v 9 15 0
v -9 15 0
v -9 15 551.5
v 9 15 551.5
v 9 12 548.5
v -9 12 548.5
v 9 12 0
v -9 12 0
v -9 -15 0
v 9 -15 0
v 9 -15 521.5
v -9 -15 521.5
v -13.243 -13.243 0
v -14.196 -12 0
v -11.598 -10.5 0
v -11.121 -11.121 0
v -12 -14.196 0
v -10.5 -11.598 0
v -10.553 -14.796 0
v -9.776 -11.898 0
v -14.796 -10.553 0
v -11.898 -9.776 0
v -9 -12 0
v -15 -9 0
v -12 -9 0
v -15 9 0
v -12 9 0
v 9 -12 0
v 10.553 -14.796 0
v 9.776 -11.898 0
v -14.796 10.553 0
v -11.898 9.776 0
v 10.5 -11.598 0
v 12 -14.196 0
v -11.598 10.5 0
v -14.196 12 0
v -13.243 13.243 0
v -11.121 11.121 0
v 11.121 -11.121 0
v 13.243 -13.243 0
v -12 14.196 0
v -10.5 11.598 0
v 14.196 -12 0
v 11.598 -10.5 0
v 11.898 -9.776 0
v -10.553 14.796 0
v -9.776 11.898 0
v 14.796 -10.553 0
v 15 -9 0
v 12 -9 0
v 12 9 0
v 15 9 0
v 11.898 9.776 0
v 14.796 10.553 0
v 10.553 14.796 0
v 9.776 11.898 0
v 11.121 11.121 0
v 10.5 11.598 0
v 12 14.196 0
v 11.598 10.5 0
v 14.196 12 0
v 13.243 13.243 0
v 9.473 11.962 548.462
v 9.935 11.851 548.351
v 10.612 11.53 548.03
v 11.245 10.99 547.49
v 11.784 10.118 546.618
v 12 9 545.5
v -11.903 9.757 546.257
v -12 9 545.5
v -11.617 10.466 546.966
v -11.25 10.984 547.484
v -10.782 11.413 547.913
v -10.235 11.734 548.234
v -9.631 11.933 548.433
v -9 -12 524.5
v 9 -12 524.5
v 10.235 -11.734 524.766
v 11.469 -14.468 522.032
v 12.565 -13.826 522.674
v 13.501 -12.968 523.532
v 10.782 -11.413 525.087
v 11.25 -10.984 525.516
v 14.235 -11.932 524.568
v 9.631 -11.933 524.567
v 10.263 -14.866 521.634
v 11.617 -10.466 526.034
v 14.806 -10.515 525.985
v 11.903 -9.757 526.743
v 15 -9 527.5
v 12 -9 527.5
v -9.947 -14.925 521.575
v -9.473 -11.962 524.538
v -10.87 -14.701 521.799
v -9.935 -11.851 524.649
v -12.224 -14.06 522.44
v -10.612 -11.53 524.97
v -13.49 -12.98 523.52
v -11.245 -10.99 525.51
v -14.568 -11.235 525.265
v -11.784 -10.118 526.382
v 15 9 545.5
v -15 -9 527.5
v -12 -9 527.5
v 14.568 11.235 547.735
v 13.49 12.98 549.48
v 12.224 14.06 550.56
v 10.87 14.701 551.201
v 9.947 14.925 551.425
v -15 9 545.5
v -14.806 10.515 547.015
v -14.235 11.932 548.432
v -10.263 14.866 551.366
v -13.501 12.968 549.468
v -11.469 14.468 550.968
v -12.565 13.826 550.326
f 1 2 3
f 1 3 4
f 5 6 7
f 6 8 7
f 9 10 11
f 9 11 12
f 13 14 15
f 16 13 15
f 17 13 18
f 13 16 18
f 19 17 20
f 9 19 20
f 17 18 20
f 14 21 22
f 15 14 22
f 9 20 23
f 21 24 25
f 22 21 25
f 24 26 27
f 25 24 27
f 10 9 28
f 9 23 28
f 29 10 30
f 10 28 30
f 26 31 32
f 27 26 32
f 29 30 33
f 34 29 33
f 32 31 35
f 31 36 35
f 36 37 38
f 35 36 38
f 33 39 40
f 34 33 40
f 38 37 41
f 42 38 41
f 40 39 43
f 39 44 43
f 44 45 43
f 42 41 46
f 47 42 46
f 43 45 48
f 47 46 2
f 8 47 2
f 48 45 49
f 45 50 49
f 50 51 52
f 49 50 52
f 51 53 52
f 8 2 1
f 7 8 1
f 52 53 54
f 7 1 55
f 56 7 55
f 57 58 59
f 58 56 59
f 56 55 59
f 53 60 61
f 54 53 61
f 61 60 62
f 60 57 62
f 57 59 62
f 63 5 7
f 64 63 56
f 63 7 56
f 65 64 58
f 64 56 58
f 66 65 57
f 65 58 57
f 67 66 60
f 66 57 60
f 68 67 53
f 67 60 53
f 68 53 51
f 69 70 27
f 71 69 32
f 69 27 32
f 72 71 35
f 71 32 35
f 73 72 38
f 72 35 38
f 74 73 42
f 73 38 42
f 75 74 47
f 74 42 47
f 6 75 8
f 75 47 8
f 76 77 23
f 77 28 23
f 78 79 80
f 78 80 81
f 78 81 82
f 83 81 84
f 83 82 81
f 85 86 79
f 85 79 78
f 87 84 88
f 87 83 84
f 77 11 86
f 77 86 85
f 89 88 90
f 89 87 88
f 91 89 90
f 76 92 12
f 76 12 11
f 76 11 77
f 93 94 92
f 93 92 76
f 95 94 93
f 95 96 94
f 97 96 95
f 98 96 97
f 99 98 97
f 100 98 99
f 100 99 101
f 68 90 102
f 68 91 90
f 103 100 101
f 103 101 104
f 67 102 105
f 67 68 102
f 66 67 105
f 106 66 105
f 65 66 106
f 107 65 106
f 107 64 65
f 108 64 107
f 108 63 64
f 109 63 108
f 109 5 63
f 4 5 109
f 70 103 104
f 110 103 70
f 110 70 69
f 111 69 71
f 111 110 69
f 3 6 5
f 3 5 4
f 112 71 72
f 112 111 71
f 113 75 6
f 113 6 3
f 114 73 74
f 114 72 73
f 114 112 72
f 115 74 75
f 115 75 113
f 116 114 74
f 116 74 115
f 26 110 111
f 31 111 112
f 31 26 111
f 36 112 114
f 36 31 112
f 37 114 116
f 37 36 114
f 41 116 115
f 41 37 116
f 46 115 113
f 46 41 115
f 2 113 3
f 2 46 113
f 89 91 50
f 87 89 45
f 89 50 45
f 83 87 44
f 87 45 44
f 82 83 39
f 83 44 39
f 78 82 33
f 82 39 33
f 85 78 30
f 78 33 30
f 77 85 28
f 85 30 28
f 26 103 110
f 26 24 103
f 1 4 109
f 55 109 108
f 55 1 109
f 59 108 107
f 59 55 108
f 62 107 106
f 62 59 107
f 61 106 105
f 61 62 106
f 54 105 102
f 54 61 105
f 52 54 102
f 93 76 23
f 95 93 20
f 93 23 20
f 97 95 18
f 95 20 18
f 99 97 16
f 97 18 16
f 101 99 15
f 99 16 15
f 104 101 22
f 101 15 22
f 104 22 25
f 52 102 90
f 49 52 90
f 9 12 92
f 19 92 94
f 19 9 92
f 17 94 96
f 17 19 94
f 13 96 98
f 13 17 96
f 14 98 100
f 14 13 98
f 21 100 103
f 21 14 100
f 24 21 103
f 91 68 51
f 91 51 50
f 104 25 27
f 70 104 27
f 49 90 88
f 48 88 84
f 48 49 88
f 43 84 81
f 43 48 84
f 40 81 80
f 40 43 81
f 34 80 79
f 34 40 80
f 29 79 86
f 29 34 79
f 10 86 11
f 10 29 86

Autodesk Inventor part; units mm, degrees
ref_plane "Start Plane" through (0, 0, 0) normal (0, 0, 1) x (1, 0, 0)
ref_plane "End Plane" through (0, 0, 551.5) normal (0, 0, 1) x (1, 0, 0)
sketch "Sketch" plane through (0, 0, 0) normal (0, 0, 1) x (1, 0, 0)
  line L0 (-15, -9) -> (-15, 9)
  line L1 (-9, 15) -> (9, 15)
  line L2 (15, 9) -> (15, -9)
  line L3 (9, -15) -> (-9, -15)
  arc A0 (-15, -9) -> (-9, -15) centre (-9, -9) ccw
  arc A1 (-9, 15) -> (-15, 9) centre (-9, 9) ccw
  arc A2 (15, 9) -> (9, 15) centre (9, 9) ccw
  arc A3 (9, -15) -> (15, -9) centre (9, -9) ccw
  arc A4 (-9, 12) -> (-12, 9) centre (-9, 9) ccw
  line L4 (-9, 12) -> (9, 12)
  arc A5 (12, 9) -> (9, 12) centre (9, 9) ccw
  line L5 (12, 9) -> (12, -9)
  arc A6 (9, -12) -> (12, -9) centre (9, -9) ccw
  line L6 (9, -12) -> (-9, -12)
  arc A7 (-12, -9) -> (-9, -12) centre (-9, -9) ccw
  line L7 (-12, -9) -> (-12, 9)
  line L8 (0, 22.7397) -> (0, -22.7397) construction
  line L9 (-22.7397, 0) -> (22.7397, 0) construction
  dimension "d7" = 6
  dimension "d10" = 30
  dimension "d11" = 30
  dimension "d12" = 3
  dimension "d15" = 15
  dimension "d16" = 15
extrude "Body" add sketch "Sketch" along normal up to surface (551.5 mm away) from surface at 0
sketch "Sketch3" plane through (0, 0, 0) normal (0, 0, 1) x (1, 0, 0)
  line L0 (0, 0) -> (10, 0)
ref_plane "Work Plane3" through (0, 0, 0) normal (0, -1, 0) x (1, 0, 0)
ref_plane "Work Plane5" through (0, 15, 551.5) normal (0, -0.7071, 0.7071) x (1, 0, 0)
split "Split2" plane through (0, 15, 551.5) removes the side toward (0, -0.7071, 0.7071)
sketch "Sketch4" plane through (0, 0, 0) normal (0, -1, 0) x (1, 0, 0)
  line L0 (-2, 0) -> (12, 0) projected
  line L1 (-2, 551.5) -> (12, 551.5) projected
  dimension "d18" = 551.5
equation "\"d7\" = G_IR"
equation "\"d10\" = G_H"
equation "\"d11\" = G_W"
equation "\"d12\" = G_T"
equation "\"d15\" = 0.5 * d10"
equation "\"d16\" = 0.5 * d11"
equation "\"d3\" = G_L"
equation "\"G_W\" = 30"
equation "\"G_H\" = 30"
equation "\"G_T\" = 3"
equation "\"G_IR\" = 6"
equation "\"G_L\" = d18"
equation "\"G_OFFSET_START\" = 0"
equation "\"G_OFFSET_END\" = 15"
equation "\"d14\" = G_OFFSET_END + B_L"
equation "\"B_L\" = 536.5"
properties part number "DIN EN 10219-2 - 30 x 30 x 3  - 551.5" material "Steel, Mild"
